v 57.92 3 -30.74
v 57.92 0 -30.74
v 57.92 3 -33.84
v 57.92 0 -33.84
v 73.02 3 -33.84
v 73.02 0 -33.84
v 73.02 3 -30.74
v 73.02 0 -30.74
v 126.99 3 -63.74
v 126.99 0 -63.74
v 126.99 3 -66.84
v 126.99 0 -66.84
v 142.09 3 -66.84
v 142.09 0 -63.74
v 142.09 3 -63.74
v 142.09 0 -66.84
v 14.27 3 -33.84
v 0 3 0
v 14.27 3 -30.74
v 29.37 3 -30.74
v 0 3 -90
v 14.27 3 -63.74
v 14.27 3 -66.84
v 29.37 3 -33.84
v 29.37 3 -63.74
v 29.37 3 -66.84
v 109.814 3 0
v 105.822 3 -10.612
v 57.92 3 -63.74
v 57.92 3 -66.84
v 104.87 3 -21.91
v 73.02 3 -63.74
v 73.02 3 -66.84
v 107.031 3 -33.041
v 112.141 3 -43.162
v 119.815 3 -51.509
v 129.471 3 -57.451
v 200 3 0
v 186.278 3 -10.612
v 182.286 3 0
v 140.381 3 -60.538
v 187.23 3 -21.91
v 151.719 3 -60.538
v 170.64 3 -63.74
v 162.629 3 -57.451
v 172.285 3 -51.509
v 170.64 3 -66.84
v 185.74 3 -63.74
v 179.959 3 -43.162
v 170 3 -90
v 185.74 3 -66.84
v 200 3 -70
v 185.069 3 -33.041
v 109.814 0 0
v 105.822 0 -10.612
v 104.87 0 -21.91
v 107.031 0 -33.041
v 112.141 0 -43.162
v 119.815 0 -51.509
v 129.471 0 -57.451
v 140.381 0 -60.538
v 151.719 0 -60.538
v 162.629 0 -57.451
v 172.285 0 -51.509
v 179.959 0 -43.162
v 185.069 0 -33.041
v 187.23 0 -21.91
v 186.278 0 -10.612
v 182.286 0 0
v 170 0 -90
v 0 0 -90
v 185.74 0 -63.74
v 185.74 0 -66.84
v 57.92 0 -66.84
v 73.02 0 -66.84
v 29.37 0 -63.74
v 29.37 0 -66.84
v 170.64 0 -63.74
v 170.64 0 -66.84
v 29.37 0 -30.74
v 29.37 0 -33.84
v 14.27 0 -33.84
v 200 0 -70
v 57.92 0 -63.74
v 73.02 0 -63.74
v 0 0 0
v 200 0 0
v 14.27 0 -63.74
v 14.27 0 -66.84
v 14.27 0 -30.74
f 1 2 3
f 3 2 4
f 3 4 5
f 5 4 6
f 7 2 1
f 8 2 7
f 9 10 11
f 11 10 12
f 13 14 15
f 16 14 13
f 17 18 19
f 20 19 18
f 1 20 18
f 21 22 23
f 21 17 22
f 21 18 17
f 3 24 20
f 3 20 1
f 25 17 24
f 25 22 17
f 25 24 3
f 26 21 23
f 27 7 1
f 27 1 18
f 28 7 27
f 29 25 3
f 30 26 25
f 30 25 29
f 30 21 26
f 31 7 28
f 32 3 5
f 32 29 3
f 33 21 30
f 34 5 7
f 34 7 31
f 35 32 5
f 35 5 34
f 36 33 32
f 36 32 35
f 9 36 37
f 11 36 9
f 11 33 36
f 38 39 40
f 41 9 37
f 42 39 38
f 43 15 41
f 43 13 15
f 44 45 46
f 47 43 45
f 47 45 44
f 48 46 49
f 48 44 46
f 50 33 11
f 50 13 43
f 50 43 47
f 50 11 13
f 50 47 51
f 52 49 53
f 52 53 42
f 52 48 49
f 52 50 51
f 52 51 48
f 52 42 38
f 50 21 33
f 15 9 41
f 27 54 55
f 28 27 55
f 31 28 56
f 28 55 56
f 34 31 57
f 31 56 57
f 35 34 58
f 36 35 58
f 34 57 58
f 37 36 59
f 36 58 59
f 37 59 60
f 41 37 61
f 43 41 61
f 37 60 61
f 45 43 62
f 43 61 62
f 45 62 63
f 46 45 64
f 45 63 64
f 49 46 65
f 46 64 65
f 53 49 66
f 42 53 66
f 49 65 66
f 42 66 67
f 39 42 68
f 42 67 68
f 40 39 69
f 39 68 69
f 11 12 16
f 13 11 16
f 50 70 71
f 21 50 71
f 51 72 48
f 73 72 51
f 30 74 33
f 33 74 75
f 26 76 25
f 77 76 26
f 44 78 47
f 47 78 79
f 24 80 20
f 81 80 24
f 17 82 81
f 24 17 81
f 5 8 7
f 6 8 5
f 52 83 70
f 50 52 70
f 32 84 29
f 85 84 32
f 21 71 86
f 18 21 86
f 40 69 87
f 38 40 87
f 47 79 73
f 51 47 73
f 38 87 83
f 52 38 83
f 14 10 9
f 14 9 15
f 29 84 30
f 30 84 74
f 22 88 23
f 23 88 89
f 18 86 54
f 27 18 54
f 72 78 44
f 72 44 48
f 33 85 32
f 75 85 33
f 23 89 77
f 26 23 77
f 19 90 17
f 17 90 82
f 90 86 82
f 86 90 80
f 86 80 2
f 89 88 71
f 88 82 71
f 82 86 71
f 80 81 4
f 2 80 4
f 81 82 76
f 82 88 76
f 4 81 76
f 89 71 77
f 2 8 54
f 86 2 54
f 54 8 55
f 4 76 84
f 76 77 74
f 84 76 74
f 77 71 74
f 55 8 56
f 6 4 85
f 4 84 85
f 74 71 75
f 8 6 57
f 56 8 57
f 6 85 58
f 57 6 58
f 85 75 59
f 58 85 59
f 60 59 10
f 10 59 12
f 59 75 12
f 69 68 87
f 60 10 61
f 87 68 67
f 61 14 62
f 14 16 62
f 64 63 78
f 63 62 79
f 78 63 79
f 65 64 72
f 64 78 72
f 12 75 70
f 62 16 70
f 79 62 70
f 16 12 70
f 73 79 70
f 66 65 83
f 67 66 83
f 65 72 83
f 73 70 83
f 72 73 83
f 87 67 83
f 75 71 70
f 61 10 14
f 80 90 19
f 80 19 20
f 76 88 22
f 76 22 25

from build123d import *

# Parameters (mm, degrees)
SKETCH2_W           = 15.1
SKETCH2_H           = 3.1
BOSS_EXTRUDE2_DEPTH = 3


with BuildPart() as part:
    # Sketch2 → Boss-Extrude2 (new body)
    with BuildSketch(Plane(origin=(0, 0, 0), x_dir=(1, 0, 0), z_dir=(0, 1, 0))):
        with BuildLine():
            Line((0, 0), (109.814085495, 0))
            ThreePointArc((109.814085495, 0), (146.05, 60.93), (182.285914505, 0))
            Line((182.285914505, 0), (200, 0))
            Line((200, 0), (200, 70))
            Line((200, 70), (170, 90))
            Line((170, 90), (0, 90))
            Line((0, 90), (0, 0))
        make_face()
        with Locations((21.82, 32.29)):
            Rectangle(SKETCH2_W, SKETCH2_H, mode=Mode.SUBTRACT)
        with Locations((65.47, 32.29)):
            Rectangle(SKETCH2_W, SKETCH2_H, mode=Mode.SUBTRACT)
        with Locations((21.82, 65.29)):
            Rectangle(SKETCH2_W, SKETCH2_H, mode=Mode.SUBTRACT)
        with Locations((65.47, 65.29)):
            Rectangle(SKETCH2_W, SKETCH2_H, mode=Mode.SUBTRACT)
        with Locations((134.54, 65.29)):
            Rectangle(SKETCH2_W, SKETCH2_H, mode=Mode.SUBTRACT)
        with Locations((178.19, 65.29)):
            Rectangle(SKETCH2_W, SKETCH2_H, mode=Mode.SUBTRACT)
    extrude(amount=BOSS_EXTRUDE2_DEPTH)


solid = part.part
